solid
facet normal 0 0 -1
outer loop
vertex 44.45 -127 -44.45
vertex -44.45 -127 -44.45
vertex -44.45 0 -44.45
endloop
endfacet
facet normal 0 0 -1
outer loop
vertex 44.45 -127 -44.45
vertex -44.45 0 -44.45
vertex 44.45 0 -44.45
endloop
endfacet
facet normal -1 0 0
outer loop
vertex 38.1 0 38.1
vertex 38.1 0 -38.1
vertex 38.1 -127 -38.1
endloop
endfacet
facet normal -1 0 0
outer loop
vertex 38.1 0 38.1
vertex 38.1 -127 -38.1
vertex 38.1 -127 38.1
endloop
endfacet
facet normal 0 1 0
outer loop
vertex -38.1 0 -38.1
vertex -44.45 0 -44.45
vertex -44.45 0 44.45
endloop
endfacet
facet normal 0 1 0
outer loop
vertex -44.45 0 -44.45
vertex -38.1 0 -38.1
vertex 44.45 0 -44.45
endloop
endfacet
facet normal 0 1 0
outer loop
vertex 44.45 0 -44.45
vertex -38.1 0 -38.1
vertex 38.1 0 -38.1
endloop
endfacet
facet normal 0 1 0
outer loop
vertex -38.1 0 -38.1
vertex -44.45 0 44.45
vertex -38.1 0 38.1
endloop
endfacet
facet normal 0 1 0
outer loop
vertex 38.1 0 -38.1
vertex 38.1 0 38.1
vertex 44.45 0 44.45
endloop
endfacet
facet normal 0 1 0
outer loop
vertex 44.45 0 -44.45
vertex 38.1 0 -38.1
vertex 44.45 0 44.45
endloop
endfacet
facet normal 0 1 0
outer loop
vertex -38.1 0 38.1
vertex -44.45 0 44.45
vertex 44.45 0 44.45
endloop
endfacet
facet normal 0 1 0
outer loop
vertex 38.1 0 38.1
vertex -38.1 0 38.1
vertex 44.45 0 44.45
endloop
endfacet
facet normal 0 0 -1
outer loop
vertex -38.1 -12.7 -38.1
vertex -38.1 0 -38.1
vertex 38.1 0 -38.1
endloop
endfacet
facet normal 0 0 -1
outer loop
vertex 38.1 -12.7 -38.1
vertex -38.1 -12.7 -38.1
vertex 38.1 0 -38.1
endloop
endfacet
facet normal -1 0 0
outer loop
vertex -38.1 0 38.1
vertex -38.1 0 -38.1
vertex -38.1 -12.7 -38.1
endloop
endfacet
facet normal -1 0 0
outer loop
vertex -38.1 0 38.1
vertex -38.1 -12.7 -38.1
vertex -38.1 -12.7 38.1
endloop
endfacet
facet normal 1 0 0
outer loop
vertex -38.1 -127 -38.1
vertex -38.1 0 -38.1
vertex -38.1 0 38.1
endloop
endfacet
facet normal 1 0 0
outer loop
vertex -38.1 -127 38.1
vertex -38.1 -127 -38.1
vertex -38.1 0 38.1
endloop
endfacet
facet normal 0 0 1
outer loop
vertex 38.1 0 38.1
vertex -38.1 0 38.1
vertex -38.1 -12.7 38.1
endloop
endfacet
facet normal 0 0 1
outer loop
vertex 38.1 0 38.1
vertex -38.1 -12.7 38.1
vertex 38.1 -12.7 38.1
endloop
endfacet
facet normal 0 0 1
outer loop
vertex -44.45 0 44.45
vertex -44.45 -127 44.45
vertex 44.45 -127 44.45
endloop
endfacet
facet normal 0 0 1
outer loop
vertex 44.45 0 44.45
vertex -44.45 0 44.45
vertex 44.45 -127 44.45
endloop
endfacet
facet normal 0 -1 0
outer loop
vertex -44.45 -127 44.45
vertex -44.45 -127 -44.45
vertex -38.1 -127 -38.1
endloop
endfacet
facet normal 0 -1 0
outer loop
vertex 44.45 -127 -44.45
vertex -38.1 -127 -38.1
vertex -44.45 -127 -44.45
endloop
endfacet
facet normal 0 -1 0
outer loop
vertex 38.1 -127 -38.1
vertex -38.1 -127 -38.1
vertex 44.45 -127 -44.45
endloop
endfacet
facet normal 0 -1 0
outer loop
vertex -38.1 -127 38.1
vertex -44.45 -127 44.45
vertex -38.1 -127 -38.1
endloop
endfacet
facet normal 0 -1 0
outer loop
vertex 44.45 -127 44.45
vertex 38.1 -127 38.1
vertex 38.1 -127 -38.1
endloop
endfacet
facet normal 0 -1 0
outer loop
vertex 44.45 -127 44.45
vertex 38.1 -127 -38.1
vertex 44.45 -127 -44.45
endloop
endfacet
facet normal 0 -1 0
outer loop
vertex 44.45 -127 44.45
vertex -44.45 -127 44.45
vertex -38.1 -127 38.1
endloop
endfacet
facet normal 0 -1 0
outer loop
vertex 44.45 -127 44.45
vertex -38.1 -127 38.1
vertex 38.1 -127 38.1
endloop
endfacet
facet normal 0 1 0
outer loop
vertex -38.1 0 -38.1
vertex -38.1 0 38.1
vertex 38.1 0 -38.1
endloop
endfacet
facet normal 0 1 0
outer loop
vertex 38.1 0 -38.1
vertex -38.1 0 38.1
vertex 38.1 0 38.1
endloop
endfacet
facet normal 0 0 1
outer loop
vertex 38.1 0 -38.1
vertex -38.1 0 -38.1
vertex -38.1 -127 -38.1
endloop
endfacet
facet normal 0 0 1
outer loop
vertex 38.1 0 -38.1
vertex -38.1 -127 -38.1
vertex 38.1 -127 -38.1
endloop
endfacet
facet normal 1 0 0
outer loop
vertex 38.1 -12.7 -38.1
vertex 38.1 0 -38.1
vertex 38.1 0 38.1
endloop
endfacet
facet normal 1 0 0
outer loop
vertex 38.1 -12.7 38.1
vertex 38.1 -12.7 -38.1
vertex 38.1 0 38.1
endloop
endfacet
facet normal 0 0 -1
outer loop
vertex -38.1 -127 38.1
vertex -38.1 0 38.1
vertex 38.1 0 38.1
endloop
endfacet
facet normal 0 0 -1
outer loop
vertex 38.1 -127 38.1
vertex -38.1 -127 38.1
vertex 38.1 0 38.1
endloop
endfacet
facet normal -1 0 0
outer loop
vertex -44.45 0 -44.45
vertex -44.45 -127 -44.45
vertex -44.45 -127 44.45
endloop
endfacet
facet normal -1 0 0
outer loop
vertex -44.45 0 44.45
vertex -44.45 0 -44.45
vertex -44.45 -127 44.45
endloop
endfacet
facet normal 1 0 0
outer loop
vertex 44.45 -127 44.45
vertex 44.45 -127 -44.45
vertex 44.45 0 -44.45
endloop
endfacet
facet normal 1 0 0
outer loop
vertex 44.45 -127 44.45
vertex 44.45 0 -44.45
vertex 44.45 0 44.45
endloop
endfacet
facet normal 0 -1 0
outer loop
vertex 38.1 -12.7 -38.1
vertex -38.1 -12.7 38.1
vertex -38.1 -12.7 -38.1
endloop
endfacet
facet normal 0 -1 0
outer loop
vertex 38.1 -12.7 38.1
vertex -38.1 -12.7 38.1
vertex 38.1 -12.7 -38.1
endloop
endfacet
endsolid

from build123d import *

# Parameters (mm, degrees)
F0_W     = 88.9
F0_H     = 88.9
F0_W_2   = 76.2
F0_H_2   = 76.2
F1_DEPTH = 127
F2_DEPTH = 12.7


with BuildPart() as f1:
    # F0 (on Front) → F1 (new body)
    with BuildSketch(Plane.XZ):
        Rectangle(F0_W, F0_H)
        Rectangle(F0_W_2, F0_H_2, mode=Mode.SUBTRACT)
    extrude(amount=F1_DEPTH)


with BuildPart() as f2:
    # F0 (on Front) → F2 (new body)
    with BuildSketch(Plane.XZ):
        Rectangle(F0_W_2, F0_H_2)
    extrude(amount=F2_DEPTH)


solid = Compound([f1.part, f2.part])
